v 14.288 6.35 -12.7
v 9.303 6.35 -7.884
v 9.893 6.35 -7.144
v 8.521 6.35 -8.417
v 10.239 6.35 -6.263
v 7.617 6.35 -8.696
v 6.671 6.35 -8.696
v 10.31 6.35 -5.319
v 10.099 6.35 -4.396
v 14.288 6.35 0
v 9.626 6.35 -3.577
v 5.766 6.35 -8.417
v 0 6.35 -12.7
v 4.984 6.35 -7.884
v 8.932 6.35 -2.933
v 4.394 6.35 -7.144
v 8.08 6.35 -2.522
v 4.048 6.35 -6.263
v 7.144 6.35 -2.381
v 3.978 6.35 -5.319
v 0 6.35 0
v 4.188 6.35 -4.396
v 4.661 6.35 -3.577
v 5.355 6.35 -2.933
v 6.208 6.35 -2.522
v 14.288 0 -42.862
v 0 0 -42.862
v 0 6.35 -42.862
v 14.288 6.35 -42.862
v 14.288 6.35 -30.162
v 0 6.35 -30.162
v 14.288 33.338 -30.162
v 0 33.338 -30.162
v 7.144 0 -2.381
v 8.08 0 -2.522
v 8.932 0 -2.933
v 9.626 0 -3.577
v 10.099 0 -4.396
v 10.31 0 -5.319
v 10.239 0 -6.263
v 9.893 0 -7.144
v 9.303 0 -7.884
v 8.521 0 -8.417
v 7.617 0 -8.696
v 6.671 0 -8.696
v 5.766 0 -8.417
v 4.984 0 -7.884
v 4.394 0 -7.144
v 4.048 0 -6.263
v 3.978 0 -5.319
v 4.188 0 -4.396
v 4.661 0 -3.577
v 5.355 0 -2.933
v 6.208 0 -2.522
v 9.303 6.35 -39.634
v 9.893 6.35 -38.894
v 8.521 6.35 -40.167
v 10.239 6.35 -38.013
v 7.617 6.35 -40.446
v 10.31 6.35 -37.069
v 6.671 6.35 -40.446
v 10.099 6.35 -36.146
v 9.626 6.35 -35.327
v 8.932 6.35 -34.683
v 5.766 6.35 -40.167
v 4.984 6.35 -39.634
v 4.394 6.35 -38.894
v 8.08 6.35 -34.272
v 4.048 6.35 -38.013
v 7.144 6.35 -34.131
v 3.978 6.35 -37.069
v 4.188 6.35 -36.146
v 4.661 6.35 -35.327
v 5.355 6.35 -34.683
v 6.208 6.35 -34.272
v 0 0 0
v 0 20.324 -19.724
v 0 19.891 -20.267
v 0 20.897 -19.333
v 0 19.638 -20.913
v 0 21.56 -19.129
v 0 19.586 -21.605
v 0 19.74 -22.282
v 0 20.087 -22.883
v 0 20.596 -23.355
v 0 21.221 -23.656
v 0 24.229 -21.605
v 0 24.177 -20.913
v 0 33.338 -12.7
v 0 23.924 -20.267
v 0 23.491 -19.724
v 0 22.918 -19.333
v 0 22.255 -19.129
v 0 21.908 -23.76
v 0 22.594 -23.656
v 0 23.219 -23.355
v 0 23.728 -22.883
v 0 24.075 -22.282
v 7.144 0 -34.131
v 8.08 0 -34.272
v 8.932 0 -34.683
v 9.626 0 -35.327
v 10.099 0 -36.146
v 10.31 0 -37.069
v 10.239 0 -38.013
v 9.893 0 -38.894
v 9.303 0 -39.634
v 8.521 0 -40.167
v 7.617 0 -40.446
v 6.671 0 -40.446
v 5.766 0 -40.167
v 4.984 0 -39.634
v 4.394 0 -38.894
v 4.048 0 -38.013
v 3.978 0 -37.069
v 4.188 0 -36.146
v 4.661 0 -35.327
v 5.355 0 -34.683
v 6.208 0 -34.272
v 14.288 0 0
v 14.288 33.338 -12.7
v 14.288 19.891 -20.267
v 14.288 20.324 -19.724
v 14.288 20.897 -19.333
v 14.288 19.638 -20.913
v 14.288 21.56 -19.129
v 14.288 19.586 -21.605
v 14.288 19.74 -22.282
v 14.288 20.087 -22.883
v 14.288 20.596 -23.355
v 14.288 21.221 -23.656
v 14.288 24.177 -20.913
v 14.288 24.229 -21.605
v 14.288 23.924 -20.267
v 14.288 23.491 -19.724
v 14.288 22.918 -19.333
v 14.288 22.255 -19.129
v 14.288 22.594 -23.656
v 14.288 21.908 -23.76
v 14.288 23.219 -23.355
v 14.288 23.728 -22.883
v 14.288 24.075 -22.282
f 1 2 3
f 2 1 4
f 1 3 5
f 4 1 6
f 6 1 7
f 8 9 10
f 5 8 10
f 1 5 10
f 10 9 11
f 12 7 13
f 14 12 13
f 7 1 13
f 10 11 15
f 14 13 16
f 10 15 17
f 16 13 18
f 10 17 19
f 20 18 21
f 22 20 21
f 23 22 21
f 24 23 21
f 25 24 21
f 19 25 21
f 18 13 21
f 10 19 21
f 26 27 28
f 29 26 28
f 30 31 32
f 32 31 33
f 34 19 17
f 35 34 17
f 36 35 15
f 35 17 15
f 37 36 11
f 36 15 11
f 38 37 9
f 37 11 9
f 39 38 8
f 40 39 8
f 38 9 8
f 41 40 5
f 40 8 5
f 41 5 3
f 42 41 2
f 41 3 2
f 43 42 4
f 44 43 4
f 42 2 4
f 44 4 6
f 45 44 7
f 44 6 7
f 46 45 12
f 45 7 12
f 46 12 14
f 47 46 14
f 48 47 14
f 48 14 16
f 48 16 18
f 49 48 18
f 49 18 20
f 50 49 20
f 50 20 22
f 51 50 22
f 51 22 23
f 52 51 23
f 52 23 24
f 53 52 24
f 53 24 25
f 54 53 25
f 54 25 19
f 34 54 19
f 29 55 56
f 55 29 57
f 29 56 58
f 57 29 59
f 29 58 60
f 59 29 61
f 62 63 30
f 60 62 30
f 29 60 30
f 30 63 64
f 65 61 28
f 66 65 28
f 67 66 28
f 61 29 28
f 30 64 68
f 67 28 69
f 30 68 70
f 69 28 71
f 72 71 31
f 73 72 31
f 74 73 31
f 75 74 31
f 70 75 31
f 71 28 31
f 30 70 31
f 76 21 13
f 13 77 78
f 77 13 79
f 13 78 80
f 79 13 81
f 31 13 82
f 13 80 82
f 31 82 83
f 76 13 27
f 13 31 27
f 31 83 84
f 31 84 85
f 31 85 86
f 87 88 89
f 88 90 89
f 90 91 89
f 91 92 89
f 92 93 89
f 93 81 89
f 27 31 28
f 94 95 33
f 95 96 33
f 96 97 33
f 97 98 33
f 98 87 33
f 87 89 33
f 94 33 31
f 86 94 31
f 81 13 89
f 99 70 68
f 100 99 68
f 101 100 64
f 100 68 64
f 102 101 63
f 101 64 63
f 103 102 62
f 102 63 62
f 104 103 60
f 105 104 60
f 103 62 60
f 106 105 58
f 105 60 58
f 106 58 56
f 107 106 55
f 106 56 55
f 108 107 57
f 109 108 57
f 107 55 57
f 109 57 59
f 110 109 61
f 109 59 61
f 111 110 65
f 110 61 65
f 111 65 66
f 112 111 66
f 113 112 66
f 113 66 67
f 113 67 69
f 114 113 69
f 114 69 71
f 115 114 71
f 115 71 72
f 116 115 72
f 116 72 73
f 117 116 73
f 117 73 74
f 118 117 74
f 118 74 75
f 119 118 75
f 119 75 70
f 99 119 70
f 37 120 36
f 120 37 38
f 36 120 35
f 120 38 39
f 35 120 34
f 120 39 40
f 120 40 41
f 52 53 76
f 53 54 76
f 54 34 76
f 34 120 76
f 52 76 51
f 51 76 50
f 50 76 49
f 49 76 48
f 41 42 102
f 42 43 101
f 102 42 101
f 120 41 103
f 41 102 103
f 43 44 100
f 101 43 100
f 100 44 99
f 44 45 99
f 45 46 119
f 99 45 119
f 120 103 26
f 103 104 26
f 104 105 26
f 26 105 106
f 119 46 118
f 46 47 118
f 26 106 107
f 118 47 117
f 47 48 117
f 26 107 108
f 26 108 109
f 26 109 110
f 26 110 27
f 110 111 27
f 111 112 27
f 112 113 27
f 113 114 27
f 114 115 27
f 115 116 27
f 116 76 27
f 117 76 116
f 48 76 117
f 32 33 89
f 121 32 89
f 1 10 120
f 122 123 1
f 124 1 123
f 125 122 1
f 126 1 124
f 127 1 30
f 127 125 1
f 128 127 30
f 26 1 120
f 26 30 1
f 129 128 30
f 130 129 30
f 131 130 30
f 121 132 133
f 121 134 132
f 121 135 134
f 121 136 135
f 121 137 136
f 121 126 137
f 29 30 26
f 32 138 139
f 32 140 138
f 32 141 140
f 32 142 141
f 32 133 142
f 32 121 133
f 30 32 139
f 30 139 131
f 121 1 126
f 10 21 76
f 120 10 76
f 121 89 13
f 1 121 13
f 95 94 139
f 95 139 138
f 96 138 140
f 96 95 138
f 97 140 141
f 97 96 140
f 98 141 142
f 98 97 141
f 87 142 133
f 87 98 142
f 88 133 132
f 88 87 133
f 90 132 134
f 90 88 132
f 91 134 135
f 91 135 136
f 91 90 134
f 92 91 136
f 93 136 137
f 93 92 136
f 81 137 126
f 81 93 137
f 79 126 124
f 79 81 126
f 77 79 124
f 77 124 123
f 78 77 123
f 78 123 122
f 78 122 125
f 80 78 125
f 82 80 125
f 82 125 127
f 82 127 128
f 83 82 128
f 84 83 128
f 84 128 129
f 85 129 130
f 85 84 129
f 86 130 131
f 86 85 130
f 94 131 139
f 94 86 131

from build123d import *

# Parameters (mm, degrees)
SKETCH1_R           = 2.328333333
BOSS_EXTRUDE1_DEPTH = 14.2875
SKETCH2_R           = 3.175
CUT_EXTRUDE1_DEPTH  = 14.2875


with BuildPart() as part:
    # Sketch1 → Boss-Extrude1 (new body)
    with BuildSketch(Plane(origin=(0, 0, 0), x_dir=(0, 0, -1), z_dir=(1, 0, 0))):
        Polygon((0, 0), (42.8625, 0), (42.8625, 6.35), (30.1625, 6.35), (30.1625, 33.3375), (12.7, 33.3375), (12.7, 6.35), (0, 6.35), align=None)
        with Locations((21.43125, 21.9075)):
            Circle(SKETCH1_R, mode=Mode.SUBTRACT)
    extrude(amount=BOSS_EXTRUDE1_DEPTH)

    # Sketch2 → Cut-Extrude1 (cut)
    with BuildSketch(Plane(origin=(0, 6.35, 0), x_dir=(1, 0, 0), z_dir=(0, 1, 0))):
        with Locations(Location((7.14375, 5.55625, 0), (0, 0, 270))):
            Circle(SKETCH2_R)
        with Locations(Location((7.14375, 37.30625, 0), (0, 0, 270))):
            Circle(SKETCH2_R)
    extrude(amount=-CUT_EXTRUDE1_DEPTH, mode=Mode.SUBTRACT)


solid = part.part
